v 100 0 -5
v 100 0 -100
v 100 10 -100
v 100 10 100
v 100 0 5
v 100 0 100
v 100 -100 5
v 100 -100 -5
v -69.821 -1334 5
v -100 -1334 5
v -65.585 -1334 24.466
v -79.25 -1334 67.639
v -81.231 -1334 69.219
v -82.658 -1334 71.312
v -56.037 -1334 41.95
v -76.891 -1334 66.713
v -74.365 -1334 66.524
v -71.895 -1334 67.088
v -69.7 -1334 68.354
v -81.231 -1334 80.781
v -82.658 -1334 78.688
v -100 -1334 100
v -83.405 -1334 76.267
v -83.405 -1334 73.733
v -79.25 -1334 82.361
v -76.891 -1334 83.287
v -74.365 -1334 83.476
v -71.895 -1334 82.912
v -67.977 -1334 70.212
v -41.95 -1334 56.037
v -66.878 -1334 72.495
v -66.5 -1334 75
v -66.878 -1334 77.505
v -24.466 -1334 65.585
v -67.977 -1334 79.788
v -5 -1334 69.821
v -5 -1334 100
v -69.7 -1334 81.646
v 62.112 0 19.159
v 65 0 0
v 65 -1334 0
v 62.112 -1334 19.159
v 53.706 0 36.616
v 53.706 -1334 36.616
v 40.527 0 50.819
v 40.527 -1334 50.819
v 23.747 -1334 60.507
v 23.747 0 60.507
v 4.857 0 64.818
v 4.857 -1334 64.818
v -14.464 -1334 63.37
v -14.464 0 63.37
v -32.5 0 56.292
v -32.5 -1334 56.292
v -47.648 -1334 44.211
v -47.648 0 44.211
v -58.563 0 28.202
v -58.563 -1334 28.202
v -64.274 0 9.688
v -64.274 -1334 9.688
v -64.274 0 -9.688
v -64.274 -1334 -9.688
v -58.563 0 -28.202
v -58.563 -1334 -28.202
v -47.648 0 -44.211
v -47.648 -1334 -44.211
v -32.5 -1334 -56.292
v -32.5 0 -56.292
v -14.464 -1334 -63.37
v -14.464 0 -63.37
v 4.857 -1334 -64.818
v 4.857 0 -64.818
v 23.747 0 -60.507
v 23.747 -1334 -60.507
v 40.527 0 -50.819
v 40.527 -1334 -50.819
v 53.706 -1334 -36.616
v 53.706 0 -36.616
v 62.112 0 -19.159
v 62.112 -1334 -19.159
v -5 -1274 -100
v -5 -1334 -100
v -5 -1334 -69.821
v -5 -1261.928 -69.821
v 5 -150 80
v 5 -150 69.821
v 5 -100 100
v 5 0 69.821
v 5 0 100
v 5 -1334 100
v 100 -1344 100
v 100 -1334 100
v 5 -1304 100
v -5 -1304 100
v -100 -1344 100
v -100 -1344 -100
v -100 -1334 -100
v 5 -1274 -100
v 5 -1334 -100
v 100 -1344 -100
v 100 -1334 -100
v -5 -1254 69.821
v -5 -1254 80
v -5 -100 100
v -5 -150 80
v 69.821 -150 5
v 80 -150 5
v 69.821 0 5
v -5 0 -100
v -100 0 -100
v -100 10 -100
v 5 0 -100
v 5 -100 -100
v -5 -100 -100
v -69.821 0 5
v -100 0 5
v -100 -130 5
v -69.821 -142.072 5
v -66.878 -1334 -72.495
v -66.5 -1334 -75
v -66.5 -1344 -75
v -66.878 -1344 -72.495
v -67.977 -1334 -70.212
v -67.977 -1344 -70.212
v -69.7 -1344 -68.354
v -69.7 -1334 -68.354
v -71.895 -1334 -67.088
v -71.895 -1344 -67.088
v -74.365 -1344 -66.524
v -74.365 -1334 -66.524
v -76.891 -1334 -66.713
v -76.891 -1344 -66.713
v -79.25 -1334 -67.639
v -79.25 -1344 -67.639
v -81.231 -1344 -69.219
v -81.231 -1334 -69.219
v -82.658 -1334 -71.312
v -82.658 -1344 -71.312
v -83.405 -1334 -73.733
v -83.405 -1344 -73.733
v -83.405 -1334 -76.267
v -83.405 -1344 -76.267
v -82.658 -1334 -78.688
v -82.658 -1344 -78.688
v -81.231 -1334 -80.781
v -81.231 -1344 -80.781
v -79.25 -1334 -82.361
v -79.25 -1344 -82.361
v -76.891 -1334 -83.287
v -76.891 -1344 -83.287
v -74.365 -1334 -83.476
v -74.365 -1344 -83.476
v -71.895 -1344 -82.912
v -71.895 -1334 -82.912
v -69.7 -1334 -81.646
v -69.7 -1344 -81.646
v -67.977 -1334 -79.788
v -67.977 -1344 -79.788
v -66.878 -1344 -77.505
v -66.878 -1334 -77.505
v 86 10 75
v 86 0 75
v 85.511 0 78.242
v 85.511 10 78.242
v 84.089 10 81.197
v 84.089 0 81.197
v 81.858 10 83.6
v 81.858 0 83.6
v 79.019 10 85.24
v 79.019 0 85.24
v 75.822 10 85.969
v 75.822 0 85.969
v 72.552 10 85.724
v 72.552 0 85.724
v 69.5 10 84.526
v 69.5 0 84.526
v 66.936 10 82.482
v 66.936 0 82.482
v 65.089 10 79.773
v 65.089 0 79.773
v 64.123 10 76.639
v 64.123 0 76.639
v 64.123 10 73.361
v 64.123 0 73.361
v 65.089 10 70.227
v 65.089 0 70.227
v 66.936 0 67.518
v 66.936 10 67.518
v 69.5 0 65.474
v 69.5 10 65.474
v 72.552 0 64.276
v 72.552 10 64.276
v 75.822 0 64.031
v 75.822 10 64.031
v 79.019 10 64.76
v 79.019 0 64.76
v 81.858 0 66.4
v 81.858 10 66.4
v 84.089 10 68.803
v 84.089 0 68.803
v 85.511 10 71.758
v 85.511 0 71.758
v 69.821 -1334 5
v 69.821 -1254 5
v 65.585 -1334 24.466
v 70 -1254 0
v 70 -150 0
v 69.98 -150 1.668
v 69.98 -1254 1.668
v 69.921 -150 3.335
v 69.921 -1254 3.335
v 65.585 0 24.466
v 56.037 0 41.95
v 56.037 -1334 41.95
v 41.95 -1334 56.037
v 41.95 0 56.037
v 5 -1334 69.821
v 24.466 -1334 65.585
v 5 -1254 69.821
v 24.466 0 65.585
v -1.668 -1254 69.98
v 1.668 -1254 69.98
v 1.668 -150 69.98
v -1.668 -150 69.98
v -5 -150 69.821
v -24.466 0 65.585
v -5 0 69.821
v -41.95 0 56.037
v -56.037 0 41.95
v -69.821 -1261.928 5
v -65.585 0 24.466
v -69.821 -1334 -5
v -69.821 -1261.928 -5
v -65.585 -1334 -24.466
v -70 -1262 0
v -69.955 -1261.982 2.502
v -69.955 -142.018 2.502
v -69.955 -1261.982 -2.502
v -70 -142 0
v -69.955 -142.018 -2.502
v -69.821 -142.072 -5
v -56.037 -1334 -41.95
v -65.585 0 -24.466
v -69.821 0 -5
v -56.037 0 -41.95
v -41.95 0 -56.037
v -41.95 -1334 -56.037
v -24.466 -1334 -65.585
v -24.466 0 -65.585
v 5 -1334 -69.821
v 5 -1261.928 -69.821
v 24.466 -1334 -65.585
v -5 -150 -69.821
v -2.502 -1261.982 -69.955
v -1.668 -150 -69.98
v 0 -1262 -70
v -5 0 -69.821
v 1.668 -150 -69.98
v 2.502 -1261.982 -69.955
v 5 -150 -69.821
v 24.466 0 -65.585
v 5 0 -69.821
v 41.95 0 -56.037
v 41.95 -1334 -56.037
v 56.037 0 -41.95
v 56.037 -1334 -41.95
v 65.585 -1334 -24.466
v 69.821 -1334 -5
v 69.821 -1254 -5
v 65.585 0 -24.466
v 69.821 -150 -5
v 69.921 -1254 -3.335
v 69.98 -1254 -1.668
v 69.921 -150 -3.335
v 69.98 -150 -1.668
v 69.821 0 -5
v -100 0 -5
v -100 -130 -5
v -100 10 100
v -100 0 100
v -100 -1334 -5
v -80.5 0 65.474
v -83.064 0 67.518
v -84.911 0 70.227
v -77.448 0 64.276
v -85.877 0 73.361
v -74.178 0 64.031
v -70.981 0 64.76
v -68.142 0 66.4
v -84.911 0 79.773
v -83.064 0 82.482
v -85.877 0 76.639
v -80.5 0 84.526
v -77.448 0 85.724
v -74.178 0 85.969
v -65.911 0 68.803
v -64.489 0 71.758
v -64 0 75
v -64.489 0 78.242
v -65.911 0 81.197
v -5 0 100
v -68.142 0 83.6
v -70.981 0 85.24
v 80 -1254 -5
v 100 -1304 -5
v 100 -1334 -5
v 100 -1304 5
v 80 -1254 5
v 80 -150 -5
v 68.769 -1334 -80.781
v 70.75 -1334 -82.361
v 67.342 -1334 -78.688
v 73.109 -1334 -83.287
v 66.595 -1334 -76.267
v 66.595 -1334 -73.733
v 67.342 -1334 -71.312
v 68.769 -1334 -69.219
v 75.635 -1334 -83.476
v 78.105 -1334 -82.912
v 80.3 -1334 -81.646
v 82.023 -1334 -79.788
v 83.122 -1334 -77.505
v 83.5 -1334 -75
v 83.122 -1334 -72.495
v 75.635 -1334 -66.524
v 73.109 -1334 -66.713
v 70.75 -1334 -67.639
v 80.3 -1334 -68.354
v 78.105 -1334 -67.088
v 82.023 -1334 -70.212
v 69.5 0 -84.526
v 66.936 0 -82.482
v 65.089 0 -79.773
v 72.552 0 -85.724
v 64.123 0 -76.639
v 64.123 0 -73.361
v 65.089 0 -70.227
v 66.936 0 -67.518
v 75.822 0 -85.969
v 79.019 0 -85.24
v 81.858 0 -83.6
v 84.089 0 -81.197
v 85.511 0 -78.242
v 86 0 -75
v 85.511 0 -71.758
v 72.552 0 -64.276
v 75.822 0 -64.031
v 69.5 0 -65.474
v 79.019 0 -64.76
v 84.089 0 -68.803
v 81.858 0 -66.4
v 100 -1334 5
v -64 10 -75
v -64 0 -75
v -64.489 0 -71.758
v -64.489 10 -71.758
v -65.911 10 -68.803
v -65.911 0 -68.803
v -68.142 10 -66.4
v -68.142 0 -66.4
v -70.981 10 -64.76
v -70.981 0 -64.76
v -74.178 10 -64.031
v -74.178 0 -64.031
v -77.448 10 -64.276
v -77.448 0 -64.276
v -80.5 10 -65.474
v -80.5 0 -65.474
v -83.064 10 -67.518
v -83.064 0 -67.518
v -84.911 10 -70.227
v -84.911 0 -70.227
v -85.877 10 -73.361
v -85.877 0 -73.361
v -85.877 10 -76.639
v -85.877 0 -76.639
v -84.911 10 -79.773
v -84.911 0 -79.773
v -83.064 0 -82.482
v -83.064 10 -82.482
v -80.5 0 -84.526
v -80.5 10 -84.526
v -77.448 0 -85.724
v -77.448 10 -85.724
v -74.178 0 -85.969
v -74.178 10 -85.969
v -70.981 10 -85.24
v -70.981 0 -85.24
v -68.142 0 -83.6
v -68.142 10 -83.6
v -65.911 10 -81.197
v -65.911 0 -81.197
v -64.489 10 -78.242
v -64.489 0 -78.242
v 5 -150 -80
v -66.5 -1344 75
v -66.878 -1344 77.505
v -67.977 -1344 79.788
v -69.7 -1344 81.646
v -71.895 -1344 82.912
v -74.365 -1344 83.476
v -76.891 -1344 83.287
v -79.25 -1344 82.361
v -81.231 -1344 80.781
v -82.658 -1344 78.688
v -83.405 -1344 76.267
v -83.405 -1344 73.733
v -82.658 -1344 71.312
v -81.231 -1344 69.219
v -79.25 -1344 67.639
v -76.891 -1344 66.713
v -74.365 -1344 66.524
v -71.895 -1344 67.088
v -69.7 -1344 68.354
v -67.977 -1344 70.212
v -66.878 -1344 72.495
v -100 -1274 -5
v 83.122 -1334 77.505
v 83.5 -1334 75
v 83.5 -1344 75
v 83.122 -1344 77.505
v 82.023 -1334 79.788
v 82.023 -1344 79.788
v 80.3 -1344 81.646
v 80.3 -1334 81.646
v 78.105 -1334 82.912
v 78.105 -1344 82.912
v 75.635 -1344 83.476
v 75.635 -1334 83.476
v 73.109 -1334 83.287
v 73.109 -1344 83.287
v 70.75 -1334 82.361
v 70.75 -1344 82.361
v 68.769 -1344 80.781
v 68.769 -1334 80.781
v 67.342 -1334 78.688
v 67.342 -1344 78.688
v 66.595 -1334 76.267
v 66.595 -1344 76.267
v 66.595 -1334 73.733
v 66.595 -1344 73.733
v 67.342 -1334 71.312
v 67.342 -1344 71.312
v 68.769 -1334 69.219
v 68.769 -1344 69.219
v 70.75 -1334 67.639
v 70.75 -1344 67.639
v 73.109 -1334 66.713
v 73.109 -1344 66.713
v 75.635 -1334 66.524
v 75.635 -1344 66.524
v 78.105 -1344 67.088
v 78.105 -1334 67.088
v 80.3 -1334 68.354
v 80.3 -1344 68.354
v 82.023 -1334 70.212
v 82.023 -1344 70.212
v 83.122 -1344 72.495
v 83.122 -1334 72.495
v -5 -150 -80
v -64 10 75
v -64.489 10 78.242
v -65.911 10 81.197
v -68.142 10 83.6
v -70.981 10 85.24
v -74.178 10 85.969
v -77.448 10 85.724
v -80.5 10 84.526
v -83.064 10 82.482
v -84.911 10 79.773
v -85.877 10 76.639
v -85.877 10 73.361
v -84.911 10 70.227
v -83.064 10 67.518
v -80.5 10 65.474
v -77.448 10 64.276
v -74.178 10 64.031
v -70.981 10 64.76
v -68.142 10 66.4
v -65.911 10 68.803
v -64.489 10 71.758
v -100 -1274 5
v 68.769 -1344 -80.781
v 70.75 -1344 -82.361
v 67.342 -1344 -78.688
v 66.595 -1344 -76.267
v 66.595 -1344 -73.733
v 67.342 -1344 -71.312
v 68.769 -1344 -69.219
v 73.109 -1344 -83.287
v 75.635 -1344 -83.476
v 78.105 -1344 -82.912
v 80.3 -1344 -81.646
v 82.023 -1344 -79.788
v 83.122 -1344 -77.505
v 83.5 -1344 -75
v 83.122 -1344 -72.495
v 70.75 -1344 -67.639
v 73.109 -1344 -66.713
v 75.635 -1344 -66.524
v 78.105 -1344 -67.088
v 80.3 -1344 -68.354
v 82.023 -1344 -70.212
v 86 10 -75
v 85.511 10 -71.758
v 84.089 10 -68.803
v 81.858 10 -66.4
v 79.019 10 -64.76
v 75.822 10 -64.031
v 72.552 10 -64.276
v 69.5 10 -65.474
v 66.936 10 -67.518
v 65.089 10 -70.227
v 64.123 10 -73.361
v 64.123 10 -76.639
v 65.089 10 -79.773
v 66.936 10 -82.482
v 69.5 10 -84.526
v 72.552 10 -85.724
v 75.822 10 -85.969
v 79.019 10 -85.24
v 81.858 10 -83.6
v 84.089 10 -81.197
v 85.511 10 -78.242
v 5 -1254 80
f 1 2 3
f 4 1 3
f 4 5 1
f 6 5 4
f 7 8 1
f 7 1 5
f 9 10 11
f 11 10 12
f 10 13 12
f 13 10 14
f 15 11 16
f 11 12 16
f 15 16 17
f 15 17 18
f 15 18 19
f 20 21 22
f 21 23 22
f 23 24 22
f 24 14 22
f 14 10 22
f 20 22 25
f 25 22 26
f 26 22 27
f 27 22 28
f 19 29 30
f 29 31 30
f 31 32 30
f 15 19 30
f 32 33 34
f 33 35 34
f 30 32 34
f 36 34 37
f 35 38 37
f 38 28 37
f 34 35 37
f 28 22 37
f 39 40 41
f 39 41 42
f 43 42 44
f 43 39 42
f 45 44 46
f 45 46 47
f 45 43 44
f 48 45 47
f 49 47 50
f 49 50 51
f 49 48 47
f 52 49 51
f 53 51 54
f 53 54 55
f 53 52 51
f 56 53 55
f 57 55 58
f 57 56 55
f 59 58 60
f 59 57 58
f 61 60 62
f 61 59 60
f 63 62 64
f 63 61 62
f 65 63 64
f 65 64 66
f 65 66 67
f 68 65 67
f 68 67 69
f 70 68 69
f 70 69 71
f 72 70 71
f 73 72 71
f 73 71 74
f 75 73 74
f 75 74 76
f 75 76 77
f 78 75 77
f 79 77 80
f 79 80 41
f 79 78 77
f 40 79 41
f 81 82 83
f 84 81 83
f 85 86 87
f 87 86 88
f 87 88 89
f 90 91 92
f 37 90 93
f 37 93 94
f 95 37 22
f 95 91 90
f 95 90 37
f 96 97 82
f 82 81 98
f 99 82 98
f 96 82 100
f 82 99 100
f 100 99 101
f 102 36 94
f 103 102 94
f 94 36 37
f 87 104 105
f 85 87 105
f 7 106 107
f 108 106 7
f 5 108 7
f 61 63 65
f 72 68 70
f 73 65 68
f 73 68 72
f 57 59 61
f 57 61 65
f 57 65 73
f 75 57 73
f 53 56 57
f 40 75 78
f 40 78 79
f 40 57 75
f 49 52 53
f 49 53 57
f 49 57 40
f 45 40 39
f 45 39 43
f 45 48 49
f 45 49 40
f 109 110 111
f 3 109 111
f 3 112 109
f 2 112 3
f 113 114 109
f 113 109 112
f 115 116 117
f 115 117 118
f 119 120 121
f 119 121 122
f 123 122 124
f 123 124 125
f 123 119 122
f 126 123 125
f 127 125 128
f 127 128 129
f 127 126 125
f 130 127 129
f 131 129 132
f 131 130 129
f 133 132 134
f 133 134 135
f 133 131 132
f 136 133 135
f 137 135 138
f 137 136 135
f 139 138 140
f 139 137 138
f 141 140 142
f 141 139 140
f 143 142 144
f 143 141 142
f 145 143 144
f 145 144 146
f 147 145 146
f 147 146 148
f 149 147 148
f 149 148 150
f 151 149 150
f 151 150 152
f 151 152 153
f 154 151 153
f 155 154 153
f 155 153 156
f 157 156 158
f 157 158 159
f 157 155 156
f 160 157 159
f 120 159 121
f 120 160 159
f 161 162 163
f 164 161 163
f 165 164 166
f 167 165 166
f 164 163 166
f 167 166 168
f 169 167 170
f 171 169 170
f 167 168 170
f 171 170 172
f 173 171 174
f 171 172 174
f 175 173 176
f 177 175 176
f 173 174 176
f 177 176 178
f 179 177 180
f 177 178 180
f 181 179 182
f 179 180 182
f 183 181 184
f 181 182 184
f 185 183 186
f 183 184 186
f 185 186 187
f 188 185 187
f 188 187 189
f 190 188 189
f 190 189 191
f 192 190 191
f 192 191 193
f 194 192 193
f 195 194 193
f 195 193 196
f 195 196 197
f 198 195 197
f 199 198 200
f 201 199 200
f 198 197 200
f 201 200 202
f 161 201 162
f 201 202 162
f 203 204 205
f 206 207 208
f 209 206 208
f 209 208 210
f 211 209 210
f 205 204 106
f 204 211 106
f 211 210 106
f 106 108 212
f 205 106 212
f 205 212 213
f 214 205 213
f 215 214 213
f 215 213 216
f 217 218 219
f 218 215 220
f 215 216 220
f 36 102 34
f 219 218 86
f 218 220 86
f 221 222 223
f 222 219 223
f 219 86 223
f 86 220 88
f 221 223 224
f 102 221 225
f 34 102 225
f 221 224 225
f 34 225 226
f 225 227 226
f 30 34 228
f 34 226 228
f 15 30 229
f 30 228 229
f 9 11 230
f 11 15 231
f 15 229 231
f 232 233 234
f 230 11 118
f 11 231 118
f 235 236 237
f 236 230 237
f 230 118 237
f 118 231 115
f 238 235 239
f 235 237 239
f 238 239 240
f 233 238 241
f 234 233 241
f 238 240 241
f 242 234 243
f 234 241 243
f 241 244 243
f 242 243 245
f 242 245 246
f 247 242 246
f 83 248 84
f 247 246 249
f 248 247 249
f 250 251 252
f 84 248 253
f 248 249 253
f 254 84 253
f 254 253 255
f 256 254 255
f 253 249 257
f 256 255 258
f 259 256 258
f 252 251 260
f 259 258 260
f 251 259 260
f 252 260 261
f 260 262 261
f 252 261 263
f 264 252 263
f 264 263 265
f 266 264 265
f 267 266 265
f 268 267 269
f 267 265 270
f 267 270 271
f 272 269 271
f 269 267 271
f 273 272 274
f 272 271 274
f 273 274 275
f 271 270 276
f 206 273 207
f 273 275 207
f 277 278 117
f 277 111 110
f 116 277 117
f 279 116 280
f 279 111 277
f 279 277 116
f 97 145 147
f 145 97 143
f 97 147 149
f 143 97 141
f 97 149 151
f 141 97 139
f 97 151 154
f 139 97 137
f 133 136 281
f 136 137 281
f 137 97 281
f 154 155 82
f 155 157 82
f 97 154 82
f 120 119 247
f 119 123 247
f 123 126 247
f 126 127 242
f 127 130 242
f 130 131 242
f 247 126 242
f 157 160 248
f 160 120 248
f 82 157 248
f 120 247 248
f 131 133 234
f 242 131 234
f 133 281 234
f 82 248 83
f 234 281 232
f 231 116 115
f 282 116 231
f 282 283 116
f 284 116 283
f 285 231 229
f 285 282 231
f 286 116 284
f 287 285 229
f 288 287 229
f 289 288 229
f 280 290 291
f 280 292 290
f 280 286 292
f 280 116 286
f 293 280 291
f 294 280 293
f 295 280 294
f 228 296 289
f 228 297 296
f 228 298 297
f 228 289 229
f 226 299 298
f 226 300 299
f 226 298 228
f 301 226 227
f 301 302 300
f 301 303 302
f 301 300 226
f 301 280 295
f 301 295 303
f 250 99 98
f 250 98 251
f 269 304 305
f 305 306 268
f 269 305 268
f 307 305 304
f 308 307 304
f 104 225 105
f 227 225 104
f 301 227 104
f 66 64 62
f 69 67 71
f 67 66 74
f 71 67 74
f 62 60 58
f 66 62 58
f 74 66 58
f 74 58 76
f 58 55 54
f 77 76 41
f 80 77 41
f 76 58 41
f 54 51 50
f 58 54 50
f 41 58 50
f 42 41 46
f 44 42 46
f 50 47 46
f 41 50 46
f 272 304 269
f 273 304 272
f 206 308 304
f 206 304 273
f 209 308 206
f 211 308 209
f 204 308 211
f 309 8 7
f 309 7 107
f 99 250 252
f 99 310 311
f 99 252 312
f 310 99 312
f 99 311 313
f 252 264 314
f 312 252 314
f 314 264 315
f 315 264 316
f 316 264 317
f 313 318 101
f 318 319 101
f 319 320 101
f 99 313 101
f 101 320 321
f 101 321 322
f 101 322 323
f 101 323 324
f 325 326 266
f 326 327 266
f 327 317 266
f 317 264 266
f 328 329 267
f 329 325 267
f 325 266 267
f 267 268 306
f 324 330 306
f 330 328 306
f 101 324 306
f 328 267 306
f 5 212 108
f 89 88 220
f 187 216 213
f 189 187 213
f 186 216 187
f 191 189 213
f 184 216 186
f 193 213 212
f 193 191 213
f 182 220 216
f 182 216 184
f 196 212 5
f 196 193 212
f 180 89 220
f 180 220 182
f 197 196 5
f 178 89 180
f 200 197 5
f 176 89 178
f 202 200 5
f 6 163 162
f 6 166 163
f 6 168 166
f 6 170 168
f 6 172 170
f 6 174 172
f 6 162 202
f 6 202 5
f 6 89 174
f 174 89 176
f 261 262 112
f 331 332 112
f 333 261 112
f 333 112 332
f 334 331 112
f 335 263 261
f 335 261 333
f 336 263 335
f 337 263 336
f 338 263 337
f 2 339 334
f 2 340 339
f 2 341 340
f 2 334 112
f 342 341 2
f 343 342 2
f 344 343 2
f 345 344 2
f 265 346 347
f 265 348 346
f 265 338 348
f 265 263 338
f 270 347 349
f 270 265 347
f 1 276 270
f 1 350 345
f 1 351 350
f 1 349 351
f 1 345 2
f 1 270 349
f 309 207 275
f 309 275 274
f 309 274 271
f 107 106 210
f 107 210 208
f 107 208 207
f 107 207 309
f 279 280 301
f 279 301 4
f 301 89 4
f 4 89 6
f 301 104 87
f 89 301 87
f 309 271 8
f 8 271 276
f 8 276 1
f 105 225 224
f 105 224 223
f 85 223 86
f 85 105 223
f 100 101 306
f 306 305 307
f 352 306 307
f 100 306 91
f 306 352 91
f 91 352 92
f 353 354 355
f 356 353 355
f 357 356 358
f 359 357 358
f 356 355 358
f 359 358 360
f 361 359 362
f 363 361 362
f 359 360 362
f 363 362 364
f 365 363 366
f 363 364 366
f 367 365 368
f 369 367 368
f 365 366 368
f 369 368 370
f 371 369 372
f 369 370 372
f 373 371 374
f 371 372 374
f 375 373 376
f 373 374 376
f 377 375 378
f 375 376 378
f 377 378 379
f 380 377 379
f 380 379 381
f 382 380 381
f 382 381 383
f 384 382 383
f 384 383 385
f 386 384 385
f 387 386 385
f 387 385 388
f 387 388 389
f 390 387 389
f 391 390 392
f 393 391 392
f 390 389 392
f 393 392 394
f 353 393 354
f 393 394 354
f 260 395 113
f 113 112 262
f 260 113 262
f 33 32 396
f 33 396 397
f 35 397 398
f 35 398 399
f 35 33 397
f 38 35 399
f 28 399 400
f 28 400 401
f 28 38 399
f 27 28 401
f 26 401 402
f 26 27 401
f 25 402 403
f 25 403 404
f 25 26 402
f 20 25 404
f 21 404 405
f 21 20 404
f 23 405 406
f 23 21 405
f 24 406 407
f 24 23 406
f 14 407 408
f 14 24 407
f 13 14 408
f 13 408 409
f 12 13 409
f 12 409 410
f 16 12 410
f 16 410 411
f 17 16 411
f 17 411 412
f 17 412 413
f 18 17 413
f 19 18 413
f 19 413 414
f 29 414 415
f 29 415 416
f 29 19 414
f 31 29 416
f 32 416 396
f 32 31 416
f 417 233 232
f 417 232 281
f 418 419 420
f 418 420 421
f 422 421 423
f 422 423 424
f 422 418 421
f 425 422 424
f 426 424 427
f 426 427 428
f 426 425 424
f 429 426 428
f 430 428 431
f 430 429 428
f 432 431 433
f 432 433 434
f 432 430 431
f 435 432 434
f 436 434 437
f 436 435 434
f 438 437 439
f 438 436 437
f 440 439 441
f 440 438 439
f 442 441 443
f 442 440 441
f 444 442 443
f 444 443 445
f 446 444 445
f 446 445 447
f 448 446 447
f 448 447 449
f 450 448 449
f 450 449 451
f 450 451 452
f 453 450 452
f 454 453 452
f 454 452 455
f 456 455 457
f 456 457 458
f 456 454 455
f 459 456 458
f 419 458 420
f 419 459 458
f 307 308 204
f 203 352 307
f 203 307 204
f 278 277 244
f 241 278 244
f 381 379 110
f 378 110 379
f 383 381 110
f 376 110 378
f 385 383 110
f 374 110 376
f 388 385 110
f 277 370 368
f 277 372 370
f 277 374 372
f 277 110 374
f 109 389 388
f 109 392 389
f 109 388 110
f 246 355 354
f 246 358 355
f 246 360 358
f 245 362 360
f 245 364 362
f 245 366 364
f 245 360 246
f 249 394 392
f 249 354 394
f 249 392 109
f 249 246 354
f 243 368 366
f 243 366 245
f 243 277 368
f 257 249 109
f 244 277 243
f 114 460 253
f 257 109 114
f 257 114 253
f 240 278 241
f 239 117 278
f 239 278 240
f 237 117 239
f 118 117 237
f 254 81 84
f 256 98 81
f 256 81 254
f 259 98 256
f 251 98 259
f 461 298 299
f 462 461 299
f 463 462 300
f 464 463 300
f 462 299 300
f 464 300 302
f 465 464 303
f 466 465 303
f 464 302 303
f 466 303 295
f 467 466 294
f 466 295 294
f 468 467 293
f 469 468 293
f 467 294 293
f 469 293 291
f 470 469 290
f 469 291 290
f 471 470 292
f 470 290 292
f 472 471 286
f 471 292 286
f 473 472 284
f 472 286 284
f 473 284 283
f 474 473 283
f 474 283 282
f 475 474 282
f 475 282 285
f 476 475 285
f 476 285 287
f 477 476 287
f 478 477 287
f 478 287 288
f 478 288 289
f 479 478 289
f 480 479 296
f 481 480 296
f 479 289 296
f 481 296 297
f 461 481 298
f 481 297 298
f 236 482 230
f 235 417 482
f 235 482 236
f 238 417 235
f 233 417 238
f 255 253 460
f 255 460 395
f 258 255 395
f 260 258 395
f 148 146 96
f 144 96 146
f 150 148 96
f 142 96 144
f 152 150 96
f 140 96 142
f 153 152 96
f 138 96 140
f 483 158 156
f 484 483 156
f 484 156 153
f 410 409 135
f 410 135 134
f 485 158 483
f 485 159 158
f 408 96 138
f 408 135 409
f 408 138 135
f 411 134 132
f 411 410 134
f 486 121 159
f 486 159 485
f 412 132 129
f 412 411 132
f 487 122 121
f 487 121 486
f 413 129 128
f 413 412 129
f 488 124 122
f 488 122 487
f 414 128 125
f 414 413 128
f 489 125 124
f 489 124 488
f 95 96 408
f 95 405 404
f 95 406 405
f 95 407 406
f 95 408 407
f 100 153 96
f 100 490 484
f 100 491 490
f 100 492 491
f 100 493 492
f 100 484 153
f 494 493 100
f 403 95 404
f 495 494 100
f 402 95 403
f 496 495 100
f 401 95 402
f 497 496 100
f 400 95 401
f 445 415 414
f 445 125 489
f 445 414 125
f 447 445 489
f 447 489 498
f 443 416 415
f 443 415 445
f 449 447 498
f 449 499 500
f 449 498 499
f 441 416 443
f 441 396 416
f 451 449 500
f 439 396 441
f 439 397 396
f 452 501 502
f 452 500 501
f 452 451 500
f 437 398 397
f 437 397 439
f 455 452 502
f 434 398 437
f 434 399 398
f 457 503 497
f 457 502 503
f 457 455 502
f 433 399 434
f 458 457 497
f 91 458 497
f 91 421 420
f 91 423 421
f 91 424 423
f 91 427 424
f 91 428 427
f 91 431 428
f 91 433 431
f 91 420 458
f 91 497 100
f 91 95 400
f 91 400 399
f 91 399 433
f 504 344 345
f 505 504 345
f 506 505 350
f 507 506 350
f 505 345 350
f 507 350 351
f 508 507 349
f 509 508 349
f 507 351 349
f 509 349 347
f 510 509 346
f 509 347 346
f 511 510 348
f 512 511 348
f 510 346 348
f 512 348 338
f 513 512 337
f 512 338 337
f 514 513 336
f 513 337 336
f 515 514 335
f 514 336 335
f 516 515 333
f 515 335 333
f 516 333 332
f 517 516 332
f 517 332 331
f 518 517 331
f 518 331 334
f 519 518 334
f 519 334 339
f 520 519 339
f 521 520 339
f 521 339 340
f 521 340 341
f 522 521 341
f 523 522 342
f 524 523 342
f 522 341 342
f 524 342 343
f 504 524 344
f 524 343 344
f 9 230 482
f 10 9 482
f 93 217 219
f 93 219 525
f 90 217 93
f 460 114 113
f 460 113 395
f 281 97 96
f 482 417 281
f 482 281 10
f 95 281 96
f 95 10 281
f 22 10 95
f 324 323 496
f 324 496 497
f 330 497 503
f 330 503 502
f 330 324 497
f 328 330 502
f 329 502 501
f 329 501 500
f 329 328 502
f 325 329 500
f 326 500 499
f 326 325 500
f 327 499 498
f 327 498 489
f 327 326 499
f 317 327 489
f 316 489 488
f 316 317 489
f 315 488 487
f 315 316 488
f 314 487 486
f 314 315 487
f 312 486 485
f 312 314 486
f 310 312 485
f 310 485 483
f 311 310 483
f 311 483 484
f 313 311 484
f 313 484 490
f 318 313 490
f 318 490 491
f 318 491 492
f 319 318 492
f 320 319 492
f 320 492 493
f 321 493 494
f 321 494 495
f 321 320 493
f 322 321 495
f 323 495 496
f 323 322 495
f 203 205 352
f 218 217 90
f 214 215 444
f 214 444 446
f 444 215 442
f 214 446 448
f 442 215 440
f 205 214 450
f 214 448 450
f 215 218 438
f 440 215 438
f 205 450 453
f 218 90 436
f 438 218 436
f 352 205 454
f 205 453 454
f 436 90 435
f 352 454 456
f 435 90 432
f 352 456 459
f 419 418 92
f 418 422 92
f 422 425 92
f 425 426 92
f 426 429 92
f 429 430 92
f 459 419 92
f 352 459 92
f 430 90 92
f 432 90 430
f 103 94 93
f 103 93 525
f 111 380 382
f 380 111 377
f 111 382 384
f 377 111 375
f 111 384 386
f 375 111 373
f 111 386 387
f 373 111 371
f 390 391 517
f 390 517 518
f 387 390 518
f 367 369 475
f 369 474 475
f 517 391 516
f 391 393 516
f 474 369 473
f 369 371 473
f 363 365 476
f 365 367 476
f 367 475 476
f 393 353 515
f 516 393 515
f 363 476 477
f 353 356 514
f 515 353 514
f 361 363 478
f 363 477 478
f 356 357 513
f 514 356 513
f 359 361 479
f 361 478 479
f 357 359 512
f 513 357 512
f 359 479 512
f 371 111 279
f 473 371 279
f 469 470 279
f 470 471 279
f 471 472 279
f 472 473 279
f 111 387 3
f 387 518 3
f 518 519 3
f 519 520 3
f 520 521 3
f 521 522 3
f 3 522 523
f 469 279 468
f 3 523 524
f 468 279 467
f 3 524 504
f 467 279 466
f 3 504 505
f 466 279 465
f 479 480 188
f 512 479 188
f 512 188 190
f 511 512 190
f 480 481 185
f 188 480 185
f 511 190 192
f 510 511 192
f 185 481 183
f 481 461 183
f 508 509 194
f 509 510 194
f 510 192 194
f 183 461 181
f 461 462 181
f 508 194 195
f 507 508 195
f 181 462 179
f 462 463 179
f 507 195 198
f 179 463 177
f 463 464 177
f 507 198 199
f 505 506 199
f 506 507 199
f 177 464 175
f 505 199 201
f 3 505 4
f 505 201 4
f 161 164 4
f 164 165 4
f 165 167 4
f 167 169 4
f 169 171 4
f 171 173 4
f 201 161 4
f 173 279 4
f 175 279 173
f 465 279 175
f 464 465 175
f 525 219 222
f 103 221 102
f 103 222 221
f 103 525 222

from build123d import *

# Parameters (mm, degrees)
F0_R          = 70
F0_R_2        = 65
F1_DEPTH      = 1334
F2_W          = 200
F2_H          = 200
F2_R          = 11
F3_DEPTH      = 10
F4_W          = 30.1787997812
F4_H          = 10
F4_W_2        = 10
F4_H_2        = 30.1787997812
F5_DEPTH      = 150
F6_T1_DEPTH   = 269.311363913
F6_T3_DEPTH   = 269.311363913
F6_T8_DEPTH   = 269.311363913
F6_S9_R       = 70
F6_T10_DEPTH  = 139
F8_W          = 200
F8_H          = 200
F8_R          = 8.5
F9_DEPTH      = 10
F10_W         = 10
F10_H         = 30.1787997812
F10_W_2       = 30.1787997812
F10_H_2       = 10
F11_DEPTH     = 80
F12_T1_DEPTH  = 269.311363913
F12_T3_DEPTH  = 269.311363913
F12_T8_DEPTH  = 269.311363913
F12_S9_R      = 70
F12_T10_DEPTH = 139
F12_T14_DEPTH = 269.311363913
F12_S15_R     = 70
F12_T16_DEPTH = 139


# Not quite as in the source:
# - a fillet or chamfer that OpenCascade refuses, or shapes differently, is made with other operations: its cross-section is extruded or revolved along the edge and cut away or added


with BuildPart() as f1:
    # F0 (on Front) → F1 (new body)
    with BuildSketch(Plane.XZ):
        Circle(F0_R)
        Circle(F0_R_2, mode=Mode.SUBTRACT)
    extrude(amount=F1_DEPTH)

    # F2 (on Front) → F3 (join)
    with BuildSketch(Plane.XZ):
        Rectangle(F2_W, F2_H)
        with Locations((-75, -75)):
            Circle(F2_R, mode=Mode.SUBTRACT)
        with Locations((75, -75)):
            Circle(F2_R, mode=Mode.SUBTRACT)
        with Locations((-75, 75)):
            Circle(F2_R, mode=Mode.SUBTRACT)
        with Locations((75, 75)):
            Circle(F2_R, mode=Mode.SUBTRACT)
    extrude(amount=-F3_DEPTH)

    # F4 (on Front) → F5 (join)
    with BuildSketch(Plane.XZ):
        with Locations((-84.9106001094, 0)):
            Rectangle(F4_W, F4_H)
        with Locations((0, 84.9106001094)):
            Rectangle(F4_W_2, F4_H_2)
        with Locations((84.9106001094, 0)):
            Rectangle(F4_W, F4_H)
        with Locations((0, -84.9106001094)):
            Rectangle(F4_W_2, F4_H_2)
    extrude(amount=F5_DEPTH)

    # F6: chamfer of 50 x 20 on 4 edges, made by hand

    # F6_s2 → F6_t1 (cut)
    with BuildSketch(Plane.YZ.offset(-134.6556819565)):
        Polygon((-100, 100), (-150, 80), (-150, 100), align=None)
        Polygon((-100, -100), (-150, -80), (-150, -100), align=None)
    extrude(amount=F6_T1_DEPTH, mode=Mode.SUBTRACT)

    # F6_s4 → F6_t3 (cut)
    with BuildSketch(Plane.XY.offset(-134.6556819565)):
        Polygon((100, -100), (80, -150), (100, -150), align=None)
    extrude(amount=F6_T3_DEPTH, mode=Mode.SUBTRACT)


with BuildPart() as f6_tool6:
    # F6_s7 → F6_t8 (new body)
    with BuildSketch(Plane.XY.offset(134.6556819565)):
        Polygon((-100, -130), (-50, -150), (-100, -150), align=None)
    extrude(amount=-F6_T8_DEPTH)

    # F6_s9 → F6_t10 (cut, symmetric)
    with BuildSketch(Plane.XZ.offset(140)):
        Circle(F6_S9_R)
    extrude(amount=F6_T10_DEPTH, both=True, mode=Mode.SUBTRACT)


with BuildPart() as f1_1:
    add(f1.part)

    # F6_t5: cut F6_tool6
    add(f6_tool6.part, mode=Mode.SUBTRACT)

    # F8 (on offset) → F9 (join)
    with BuildSketch(Plane.XZ.offset(1334)):
        Rectangle(F8_W, F8_H)
        with Locations((-75, -75)):
            Circle(F8_R, mode=Mode.SUBTRACT)
        with Locations((75, -75)):
            Circle(F8_R, mode=Mode.SUBTRACT)
        with Locations((-75, 75)):
            Circle(F8_R, mode=Mode.SUBTRACT)
        with Locations((75, 75)):
            Circle(F8_R, mode=Mode.SUBTRACT)
    extrude(amount=F9_DEPTH)

    # F10 (on face) → F11 (join)
    with BuildSketch(Plane(origin=(0, -1334, 0), x_dir=(-1, 0, 0), z_dir=(0, 1, 0))):
        with Locations((0, 84.9106001094)):
            Rectangle(F10_W, F10_H)
        with Locations((84.9106001094, 0)):
            Rectangle(F10_W_2, F10_H_2)
        with Locations((0, -84.9106001094)):
            Rectangle(F10_W, F10_H)
        with Locations((-84.9106001094, 0)):
            Rectangle(F10_W_2, F10_H_2)
    extrude(amount=F11_DEPTH)

    # F12: chamfer of 20 x 50 on 4 edges, made by hand

    # F12_s2 → F12_t1 (cut)
    with BuildSketch(Plane.YZ.offset(-134.6556819565)):
        Polygon((-1304, 100), (-1254, 80), (-1254, 100), align=None)
    extrude(amount=F12_T1_DEPTH, mode=Mode.SUBTRACT)

    # F12_s4 → F12_t3 (cut)
    with BuildSketch(Plane.XY.offset(-134.6556819565)):
        Polygon((100, -1304), (80, -1254), (100, -1254), align=None)
    extrude(amount=F12_T3_DEPTH, mode=Mode.SUBTRACT)


with BuildPart() as f12_tool6:
    # F12_s7 → F12_t8 (new body)
    with BuildSketch(Plane.XY.offset(-134.6556819565)):
        Polygon((-100, -1274), (-50, -1254), (-100, -1254), align=None)
    extrude(amount=F12_T8_DEPTH)

    # F12_s9 → F12_t10 (cut, symmetric)
    with BuildSketch(Plane.XZ.offset(1264)):
        Circle(F12_S9_R)
    extrude(amount=F12_T10_DEPTH, both=True, mode=Mode.SUBTRACT)


with BuildPart() as f1_2:
    add(f1_1.part)

    # F12_t5: cut F12_tool6
    add(f12_tool6.part, mode=Mode.SUBTRACT)


with BuildPart() as f12_tool12:
    # F12_s13 → F12_t14 (new body)
    with BuildSketch(Plane.YZ.offset(134.6556819565)):
        Polygon((-1274, -100), (-1254, -50), (-1254, -100), align=None)
    extrude(amount=-F12_T14_DEPTH)

    # F12_s15 → F12_t16 (cut, symmetric)
    with BuildSketch(Plane.XZ.offset(1264)):
        Circle(F12_S15_R)
    extrude(amount=F12_T16_DEPTH, both=True, mode=Mode.SUBTRACT)


with BuildPart() as f1_3:
    add(f1_2.part)

    # F12_t11: cut F12_tool12
    add(f12_tool12.part, mode=Mode.SUBTRACT)


solid = f1_3.part
